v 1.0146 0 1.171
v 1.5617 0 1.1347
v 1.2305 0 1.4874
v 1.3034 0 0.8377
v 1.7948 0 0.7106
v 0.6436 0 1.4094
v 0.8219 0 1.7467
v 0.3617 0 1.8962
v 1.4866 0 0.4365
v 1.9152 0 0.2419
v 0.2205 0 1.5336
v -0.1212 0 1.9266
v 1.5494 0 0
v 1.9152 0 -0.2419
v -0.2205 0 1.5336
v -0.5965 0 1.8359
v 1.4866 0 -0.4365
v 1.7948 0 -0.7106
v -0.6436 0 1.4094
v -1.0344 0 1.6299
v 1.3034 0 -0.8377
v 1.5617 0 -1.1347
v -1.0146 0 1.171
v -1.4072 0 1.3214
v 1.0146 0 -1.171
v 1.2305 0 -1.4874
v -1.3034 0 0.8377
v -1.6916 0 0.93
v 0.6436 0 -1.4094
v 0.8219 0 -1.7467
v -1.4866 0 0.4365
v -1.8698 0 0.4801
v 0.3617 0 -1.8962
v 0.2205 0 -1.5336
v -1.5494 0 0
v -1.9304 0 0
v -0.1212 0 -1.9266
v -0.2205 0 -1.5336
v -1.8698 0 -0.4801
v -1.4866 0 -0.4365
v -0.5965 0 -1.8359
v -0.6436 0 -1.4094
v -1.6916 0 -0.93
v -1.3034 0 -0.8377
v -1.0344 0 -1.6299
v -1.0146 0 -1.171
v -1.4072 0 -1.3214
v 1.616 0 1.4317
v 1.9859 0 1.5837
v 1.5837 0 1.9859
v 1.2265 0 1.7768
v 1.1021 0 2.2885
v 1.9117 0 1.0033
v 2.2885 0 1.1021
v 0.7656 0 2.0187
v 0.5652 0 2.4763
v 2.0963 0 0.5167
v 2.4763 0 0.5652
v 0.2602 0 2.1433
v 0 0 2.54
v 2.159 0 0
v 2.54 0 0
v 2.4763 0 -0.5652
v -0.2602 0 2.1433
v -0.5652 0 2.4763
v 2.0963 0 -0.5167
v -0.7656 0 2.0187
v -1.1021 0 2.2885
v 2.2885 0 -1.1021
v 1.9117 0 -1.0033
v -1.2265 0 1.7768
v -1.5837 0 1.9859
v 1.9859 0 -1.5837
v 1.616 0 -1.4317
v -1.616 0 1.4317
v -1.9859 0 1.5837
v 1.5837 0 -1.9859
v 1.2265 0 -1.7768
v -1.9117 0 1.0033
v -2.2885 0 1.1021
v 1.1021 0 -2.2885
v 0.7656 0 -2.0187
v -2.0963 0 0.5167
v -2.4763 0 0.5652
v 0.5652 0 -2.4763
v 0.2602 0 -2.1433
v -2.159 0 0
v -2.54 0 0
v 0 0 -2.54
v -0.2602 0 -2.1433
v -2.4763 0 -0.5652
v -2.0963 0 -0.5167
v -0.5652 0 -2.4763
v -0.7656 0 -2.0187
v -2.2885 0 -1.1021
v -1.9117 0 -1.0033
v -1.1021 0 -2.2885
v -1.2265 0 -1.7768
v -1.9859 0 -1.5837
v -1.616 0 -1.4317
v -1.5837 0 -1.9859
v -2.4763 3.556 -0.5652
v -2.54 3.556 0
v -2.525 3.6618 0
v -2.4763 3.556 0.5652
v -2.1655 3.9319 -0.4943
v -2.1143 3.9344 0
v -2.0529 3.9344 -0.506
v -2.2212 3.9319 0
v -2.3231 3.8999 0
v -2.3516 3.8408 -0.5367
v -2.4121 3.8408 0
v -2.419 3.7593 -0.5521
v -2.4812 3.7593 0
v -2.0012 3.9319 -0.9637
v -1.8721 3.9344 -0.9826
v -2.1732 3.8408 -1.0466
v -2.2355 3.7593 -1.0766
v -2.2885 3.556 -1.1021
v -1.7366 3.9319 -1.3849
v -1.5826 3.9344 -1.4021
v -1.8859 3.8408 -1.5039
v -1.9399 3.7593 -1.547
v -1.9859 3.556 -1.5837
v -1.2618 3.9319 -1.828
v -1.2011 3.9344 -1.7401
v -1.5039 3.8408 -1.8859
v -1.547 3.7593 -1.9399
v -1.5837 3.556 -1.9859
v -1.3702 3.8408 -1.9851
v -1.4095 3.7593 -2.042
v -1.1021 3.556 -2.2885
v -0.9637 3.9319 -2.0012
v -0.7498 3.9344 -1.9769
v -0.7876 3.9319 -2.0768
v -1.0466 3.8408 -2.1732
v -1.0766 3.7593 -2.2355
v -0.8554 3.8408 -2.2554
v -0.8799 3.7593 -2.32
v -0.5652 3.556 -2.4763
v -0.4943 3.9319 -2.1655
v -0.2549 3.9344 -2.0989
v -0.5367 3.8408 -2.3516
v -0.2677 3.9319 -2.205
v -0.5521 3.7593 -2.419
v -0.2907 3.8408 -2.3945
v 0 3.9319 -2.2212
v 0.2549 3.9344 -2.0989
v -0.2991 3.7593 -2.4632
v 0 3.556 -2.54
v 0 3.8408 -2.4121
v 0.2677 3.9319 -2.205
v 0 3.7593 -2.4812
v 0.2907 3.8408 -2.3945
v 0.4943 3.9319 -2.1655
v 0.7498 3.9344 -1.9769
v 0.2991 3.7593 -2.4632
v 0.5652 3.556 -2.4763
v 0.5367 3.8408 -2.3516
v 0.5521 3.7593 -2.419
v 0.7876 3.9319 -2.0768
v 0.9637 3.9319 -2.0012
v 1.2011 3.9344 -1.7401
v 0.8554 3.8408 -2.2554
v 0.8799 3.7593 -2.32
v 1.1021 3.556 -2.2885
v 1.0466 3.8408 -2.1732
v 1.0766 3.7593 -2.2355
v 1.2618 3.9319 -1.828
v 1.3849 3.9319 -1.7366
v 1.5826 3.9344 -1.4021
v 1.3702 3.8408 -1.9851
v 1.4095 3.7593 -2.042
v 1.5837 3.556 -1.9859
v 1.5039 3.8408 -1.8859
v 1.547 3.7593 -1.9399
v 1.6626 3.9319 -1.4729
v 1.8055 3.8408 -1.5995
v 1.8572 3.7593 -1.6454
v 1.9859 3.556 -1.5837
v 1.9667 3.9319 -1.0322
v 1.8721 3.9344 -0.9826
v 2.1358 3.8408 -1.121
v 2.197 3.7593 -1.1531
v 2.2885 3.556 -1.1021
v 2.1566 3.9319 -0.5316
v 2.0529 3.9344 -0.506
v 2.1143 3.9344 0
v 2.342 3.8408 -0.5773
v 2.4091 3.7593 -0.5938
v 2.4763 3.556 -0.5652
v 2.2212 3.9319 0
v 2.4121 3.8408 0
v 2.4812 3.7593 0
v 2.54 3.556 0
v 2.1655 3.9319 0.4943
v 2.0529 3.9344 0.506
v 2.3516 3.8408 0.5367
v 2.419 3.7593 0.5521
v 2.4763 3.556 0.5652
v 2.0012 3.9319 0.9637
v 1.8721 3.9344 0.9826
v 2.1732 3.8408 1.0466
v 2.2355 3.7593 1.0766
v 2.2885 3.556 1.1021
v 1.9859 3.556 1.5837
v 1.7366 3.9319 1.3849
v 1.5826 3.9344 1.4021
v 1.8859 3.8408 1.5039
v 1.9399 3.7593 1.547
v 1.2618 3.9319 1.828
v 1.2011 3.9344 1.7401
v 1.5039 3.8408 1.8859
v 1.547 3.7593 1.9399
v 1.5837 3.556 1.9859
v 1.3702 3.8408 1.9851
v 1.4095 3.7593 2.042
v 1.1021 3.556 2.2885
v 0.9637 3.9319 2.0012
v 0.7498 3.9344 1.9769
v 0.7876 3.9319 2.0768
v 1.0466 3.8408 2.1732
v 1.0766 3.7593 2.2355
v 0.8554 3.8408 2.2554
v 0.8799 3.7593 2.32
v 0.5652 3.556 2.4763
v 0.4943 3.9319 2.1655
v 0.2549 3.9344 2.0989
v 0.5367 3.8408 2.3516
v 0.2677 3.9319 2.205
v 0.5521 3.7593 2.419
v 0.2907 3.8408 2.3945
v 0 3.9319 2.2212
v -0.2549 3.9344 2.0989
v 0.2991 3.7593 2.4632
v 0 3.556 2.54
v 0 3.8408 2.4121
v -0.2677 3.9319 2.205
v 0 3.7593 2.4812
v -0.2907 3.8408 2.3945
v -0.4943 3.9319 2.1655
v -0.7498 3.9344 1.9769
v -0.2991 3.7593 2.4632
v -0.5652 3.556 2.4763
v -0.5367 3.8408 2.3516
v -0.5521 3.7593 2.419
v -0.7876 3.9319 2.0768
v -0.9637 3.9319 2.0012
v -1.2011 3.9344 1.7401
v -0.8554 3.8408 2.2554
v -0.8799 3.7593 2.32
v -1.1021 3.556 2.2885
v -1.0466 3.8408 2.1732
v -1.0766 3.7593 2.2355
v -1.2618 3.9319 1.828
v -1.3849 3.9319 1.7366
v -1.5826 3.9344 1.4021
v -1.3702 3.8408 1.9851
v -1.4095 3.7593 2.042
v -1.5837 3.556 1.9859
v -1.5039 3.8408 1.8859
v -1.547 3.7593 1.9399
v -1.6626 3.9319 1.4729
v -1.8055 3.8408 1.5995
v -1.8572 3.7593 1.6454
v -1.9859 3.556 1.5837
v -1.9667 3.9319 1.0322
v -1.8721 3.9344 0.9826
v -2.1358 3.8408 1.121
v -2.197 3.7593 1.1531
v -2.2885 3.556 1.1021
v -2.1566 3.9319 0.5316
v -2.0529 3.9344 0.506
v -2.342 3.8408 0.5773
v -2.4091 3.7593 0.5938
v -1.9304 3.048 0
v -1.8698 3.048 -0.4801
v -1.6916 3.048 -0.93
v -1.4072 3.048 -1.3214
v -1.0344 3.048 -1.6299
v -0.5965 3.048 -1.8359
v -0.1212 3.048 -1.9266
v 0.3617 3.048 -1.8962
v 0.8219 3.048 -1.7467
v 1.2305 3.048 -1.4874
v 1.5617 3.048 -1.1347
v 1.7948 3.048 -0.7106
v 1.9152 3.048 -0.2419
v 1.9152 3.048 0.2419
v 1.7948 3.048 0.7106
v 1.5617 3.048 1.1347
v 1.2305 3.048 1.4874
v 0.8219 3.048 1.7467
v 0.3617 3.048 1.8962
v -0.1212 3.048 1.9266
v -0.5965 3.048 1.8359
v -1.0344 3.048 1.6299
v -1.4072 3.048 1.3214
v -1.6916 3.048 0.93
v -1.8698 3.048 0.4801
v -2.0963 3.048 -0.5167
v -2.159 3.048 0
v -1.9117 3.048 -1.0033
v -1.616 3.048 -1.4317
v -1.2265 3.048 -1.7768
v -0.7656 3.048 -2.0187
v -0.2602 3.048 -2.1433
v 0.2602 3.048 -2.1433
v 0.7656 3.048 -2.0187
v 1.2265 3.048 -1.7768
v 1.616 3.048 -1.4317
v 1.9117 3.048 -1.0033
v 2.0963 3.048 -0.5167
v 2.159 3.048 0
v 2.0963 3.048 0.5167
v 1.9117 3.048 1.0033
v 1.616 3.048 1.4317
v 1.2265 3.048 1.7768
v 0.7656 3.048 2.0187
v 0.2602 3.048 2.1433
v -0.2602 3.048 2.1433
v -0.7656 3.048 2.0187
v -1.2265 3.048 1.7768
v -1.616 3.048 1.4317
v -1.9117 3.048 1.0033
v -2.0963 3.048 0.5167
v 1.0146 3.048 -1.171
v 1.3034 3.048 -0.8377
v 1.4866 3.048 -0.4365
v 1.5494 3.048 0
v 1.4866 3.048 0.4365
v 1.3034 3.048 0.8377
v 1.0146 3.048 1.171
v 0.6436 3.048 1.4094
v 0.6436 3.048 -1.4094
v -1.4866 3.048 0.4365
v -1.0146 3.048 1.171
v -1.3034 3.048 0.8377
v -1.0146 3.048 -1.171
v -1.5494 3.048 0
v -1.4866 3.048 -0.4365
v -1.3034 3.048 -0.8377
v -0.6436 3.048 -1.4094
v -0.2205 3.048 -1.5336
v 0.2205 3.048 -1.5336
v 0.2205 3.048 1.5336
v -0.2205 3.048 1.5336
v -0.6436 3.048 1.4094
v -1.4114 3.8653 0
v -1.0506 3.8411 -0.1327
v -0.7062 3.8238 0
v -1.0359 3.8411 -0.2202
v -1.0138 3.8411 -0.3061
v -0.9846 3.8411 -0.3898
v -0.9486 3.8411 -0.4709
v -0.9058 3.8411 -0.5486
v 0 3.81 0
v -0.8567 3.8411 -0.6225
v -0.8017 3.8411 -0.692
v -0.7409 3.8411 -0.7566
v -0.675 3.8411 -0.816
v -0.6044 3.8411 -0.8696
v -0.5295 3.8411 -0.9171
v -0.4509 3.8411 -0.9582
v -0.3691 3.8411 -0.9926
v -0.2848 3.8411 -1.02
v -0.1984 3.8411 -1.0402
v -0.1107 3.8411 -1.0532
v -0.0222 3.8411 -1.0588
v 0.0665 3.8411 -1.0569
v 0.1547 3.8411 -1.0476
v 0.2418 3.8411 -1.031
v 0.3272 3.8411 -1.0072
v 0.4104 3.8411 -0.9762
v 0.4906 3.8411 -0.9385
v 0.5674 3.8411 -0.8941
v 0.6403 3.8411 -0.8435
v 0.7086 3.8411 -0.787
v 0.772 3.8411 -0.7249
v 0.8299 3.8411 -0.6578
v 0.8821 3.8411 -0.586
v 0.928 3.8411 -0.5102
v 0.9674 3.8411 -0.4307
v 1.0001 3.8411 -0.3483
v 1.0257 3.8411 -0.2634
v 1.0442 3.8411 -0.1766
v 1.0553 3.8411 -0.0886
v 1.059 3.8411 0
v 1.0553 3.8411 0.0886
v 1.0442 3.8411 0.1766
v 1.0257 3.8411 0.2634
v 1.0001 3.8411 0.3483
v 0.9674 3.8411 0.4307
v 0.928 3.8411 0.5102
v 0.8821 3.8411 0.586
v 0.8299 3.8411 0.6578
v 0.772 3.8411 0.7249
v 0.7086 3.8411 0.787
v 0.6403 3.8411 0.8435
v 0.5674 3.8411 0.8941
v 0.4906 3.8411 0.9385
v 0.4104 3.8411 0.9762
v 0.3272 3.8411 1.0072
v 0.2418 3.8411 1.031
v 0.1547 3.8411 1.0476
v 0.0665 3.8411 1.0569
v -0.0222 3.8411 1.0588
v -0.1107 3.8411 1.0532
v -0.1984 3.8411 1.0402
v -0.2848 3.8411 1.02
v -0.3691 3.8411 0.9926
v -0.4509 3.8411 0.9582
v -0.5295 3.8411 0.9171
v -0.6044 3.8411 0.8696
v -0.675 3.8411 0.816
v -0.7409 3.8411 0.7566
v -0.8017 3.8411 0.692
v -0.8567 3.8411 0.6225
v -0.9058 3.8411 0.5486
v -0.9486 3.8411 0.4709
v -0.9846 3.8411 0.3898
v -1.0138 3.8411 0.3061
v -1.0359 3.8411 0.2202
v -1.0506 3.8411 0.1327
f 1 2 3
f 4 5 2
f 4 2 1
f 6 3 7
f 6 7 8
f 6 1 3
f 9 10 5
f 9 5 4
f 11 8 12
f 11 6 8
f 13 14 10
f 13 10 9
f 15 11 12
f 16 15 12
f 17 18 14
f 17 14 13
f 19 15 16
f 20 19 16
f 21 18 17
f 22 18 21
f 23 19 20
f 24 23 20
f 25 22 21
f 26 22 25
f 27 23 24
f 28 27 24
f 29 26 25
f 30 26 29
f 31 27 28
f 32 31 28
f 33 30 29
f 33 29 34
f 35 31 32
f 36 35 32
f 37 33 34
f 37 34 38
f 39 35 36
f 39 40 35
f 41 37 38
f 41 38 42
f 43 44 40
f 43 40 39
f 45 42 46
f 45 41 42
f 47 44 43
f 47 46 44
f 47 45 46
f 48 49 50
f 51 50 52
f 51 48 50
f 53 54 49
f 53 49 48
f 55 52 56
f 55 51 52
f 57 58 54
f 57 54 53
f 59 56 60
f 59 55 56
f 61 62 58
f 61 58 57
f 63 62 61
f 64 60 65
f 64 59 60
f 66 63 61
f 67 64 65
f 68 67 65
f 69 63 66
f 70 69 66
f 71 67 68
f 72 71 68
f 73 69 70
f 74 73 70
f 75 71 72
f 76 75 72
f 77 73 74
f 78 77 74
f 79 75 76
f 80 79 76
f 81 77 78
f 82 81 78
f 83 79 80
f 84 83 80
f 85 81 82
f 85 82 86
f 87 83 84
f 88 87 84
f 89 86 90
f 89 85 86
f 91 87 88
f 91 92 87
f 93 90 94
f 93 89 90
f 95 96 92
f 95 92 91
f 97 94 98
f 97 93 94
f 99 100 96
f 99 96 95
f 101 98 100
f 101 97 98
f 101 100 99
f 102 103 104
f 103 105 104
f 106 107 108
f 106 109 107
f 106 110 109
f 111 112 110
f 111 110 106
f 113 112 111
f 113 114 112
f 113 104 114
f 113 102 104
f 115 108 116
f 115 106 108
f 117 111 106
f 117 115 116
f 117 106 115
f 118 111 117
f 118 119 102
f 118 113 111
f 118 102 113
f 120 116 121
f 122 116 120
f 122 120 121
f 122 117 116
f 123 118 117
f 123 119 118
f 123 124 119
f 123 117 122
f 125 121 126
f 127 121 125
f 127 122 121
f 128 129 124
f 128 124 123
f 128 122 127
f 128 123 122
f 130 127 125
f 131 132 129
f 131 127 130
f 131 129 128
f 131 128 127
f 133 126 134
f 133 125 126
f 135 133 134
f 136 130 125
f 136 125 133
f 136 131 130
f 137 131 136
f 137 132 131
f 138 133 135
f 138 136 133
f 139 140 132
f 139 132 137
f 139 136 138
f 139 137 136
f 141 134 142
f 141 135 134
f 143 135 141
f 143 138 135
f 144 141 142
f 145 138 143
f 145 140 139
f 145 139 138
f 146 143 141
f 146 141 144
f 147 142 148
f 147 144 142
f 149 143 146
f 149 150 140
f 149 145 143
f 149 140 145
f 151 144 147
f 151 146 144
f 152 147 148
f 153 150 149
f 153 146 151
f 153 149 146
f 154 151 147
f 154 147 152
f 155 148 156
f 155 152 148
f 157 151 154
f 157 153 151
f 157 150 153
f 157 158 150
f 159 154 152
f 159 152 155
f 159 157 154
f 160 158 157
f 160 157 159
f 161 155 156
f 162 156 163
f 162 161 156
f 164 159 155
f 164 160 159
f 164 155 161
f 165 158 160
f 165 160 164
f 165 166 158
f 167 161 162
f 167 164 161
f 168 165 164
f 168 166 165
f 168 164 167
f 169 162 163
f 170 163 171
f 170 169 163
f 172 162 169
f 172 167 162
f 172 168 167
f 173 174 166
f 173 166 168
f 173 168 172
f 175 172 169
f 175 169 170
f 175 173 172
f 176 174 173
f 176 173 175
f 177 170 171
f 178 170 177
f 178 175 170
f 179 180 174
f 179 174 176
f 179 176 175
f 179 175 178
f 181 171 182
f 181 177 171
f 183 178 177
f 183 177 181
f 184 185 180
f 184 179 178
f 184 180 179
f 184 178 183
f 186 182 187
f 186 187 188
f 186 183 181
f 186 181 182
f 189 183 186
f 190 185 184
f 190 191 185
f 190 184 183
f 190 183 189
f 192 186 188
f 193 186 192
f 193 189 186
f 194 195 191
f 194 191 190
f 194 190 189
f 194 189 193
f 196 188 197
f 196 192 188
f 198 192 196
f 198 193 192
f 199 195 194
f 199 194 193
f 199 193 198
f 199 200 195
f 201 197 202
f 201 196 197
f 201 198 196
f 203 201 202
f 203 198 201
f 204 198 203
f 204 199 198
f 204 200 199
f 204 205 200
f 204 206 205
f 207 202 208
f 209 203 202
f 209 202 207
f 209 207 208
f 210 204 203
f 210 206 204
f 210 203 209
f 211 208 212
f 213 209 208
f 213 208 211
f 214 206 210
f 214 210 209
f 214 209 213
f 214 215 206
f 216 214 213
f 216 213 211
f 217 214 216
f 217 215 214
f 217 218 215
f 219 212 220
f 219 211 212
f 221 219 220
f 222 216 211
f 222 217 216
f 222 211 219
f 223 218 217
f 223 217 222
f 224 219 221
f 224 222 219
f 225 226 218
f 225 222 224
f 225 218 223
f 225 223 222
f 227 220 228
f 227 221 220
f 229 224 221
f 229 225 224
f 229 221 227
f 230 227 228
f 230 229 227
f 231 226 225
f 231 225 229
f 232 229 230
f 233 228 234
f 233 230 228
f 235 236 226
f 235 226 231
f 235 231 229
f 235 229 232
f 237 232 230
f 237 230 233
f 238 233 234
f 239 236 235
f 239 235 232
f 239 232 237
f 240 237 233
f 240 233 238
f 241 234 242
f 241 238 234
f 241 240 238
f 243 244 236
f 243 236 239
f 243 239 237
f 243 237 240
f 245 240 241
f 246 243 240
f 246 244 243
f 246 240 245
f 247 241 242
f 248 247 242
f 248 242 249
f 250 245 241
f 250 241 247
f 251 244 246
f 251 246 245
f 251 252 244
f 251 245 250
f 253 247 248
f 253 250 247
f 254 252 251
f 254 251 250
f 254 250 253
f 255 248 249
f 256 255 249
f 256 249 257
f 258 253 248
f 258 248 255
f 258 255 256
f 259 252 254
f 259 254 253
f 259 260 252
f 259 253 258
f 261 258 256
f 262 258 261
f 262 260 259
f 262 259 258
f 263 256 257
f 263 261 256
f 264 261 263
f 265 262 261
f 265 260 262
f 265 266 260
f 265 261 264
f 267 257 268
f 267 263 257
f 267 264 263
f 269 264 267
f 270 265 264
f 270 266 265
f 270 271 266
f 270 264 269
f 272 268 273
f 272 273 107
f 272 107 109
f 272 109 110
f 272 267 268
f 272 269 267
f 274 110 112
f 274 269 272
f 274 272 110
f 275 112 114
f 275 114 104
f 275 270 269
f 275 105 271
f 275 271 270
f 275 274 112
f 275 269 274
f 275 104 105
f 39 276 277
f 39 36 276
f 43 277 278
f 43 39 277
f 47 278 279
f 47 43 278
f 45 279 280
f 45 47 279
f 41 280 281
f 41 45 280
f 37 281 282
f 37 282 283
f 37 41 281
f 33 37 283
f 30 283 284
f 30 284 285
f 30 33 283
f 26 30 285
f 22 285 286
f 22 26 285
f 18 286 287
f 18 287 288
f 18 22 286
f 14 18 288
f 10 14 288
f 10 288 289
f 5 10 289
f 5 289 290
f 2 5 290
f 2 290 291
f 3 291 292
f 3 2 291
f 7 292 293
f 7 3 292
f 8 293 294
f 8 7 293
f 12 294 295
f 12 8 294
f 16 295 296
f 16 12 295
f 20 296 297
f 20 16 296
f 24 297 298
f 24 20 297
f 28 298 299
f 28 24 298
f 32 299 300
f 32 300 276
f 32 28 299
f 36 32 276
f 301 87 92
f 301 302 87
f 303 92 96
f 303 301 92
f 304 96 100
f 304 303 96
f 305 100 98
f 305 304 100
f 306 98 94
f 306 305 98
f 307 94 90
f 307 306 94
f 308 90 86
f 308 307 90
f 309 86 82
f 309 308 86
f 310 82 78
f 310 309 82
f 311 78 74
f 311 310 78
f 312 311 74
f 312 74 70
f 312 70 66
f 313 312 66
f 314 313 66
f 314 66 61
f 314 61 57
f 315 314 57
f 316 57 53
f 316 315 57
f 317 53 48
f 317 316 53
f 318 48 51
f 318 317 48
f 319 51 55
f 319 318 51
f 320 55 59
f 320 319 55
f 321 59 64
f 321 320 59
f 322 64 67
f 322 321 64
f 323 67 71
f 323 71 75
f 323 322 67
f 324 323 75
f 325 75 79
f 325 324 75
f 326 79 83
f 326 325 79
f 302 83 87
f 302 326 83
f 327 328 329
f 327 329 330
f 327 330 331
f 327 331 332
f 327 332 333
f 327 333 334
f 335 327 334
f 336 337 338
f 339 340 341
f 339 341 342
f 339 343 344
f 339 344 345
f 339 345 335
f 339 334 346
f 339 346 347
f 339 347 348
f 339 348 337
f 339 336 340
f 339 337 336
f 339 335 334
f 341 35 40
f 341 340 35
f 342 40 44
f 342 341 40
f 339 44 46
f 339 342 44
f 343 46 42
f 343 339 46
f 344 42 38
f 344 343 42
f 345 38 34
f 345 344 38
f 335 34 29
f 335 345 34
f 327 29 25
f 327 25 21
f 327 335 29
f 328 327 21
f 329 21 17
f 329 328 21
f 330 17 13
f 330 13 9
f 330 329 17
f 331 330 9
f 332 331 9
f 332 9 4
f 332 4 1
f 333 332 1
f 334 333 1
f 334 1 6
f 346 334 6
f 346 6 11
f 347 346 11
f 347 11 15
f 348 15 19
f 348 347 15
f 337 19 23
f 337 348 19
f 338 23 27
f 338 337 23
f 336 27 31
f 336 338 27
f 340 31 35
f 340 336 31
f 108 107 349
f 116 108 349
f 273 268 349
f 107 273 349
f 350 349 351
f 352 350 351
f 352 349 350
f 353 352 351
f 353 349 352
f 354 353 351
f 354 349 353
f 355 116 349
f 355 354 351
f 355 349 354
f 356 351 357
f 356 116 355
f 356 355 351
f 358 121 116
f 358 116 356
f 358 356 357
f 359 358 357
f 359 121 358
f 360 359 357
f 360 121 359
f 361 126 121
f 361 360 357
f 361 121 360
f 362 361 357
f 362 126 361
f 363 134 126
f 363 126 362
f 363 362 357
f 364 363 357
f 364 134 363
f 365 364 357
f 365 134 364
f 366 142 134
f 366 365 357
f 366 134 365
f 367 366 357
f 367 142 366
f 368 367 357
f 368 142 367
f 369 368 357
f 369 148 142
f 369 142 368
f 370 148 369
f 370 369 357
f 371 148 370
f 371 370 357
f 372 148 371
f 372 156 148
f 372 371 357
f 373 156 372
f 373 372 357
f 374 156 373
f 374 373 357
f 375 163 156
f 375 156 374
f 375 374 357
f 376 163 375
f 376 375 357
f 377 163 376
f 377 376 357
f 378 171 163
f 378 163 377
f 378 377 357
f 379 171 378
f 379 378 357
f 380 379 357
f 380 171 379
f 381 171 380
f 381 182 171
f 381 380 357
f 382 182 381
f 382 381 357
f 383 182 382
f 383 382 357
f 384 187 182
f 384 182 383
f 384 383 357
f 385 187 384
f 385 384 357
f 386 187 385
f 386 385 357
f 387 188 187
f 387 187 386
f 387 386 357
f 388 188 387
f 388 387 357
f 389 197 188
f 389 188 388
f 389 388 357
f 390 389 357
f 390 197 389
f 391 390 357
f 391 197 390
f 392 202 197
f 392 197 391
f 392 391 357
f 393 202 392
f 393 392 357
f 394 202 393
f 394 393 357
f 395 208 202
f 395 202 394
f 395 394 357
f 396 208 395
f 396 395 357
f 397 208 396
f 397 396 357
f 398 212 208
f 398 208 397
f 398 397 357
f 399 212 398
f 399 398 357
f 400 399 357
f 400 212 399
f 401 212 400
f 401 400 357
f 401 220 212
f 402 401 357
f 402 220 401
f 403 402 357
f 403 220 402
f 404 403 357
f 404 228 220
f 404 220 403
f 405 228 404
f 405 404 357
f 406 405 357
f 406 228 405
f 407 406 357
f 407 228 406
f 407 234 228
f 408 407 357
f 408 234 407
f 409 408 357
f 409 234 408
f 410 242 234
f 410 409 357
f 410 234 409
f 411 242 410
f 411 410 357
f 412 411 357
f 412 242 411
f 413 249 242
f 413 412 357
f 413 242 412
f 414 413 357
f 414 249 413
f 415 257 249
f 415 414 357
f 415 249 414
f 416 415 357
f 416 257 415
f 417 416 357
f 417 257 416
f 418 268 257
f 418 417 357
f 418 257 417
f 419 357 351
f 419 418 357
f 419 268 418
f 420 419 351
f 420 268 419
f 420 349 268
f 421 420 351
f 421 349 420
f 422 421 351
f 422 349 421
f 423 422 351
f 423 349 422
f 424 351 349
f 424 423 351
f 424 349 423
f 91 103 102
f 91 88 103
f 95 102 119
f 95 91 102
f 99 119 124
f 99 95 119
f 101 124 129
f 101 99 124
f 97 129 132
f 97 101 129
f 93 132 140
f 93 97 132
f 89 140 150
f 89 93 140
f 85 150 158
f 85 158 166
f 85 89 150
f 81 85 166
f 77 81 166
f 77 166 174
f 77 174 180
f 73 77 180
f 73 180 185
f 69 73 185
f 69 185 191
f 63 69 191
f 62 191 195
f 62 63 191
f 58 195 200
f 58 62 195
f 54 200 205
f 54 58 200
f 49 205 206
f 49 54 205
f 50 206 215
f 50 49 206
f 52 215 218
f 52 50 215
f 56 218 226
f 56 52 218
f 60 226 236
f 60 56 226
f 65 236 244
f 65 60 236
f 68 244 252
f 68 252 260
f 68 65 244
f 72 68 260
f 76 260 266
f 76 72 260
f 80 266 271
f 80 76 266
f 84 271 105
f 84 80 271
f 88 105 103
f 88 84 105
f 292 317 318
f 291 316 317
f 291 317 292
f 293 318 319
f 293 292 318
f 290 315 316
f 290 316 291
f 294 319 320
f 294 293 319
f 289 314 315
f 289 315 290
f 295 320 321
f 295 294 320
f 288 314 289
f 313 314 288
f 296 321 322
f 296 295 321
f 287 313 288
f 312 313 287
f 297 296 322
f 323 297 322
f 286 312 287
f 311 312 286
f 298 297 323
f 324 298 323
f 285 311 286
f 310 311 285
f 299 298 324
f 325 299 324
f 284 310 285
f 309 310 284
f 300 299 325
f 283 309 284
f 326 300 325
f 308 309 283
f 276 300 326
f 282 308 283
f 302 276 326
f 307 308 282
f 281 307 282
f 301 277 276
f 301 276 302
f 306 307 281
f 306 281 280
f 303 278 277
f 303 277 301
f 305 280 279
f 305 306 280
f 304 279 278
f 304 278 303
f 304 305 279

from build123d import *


with BuildPart() as part:
    # Sketch1 → Revolve1 (revolve)
    with BuildSketch(Plane.XY):
        with BuildLine():
            Line((-1.5494, 0), (-1.5494, 3.048))
            Line((-1.5494, 3.048), (0, 3.048))
            Line((0, 3.048), (0, 3.81))
            ThreePointArc((0, 3.81), (-1.058992944, 3.841119954), (-2.114331034, 3.934372414))
            ThreePointArc((-2.114331034, 3.934372414), (-2.412122623, 3.84076295), (-2.54, 3.556))
            Line((-2.54, 3.556), (-2.54, 0))
            Line((-2.54, 0), (-2.159, 0))
            Line((-2.159, 0), (-2.159, 3.048))
            Line((-2.159, 3.048), (-1.9304, 3.048))
            Line((-1.9304, 3.048), (-1.9304, 0))
            Line((-1.9304, 0), (-1.5494, 0))
        make_face()
    revolve(axis=Axis((0, 0, 0), (0, -1, 0)))


solid = part.part
